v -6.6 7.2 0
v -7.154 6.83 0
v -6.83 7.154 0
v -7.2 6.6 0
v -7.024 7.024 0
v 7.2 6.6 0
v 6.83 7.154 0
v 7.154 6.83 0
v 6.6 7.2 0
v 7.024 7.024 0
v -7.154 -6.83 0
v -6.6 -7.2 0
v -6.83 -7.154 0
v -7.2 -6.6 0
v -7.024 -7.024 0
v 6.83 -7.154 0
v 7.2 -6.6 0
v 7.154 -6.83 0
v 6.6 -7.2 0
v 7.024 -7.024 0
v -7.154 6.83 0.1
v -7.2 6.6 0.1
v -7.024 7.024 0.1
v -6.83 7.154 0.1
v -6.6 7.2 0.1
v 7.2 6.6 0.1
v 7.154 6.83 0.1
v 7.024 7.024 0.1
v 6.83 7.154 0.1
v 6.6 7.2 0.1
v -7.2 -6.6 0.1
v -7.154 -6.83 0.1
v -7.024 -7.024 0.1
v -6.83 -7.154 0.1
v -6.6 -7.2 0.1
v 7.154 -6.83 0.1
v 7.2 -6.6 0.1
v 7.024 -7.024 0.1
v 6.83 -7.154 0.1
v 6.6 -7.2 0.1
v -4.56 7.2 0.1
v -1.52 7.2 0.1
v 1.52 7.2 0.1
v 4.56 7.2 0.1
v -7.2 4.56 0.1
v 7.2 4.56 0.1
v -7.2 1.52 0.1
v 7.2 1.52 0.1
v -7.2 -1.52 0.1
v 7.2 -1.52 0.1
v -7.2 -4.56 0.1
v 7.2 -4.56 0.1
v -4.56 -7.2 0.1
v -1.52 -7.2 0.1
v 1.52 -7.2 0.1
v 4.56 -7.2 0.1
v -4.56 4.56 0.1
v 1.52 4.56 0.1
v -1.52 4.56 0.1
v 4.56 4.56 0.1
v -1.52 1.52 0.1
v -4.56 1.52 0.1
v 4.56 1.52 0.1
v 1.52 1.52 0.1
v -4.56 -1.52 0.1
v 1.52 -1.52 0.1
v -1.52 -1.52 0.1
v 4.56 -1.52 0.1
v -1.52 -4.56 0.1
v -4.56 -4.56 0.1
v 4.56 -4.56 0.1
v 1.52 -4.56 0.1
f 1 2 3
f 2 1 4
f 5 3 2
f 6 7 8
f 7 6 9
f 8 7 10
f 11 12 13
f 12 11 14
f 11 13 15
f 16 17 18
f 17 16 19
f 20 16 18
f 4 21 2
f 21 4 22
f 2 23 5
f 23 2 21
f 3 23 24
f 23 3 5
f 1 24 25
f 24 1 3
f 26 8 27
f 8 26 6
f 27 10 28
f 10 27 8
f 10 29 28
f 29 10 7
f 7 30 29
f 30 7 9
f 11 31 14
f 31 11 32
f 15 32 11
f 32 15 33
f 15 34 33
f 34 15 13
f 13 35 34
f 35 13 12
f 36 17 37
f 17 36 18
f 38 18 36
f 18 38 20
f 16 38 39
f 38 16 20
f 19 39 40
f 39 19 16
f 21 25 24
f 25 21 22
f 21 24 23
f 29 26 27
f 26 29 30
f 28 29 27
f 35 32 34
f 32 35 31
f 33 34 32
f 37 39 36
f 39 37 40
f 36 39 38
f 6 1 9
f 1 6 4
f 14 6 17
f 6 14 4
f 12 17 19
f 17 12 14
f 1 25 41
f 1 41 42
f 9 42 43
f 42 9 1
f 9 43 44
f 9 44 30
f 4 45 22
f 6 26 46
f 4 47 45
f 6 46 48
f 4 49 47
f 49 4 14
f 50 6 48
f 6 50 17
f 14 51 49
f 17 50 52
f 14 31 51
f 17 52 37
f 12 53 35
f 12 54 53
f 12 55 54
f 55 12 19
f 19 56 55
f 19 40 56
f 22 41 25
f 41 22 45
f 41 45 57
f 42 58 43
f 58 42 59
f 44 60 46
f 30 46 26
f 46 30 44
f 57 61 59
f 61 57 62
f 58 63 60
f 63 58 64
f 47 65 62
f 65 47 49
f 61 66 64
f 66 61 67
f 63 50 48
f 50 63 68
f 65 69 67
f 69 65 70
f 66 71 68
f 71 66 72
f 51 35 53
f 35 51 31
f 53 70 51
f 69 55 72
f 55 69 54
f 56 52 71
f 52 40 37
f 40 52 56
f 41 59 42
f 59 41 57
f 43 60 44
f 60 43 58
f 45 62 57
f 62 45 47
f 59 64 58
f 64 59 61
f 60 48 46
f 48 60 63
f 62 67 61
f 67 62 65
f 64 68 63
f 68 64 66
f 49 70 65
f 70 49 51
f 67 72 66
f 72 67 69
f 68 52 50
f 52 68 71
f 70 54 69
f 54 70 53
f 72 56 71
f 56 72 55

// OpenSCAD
// file: ../p/1-4cyli.scad
use <../lib.scad>
function ldraw_lib__1_4cyli() = [
// 0 Cylinder 0.25
// 0 Name: 1-4cyli.dat
// 0 Author: James Jessiman
// 0 !LDRAW_ORG Primitive UPDATE 2012-01
// 0 !LICENSE Licensed under CC BY 4.0 : see CAreadme.txt
// 
// 0 BFC CERTIFY CCW
  [0,"BFC","CERTIFY"],
  [0,"BFC","CCW"],
// 
// 0 !HISTORY 2002-03-23 [sbliss] Added BFC statement.
// 0 !HISTORY 2002-04-25 [PTadmin] Official Update 2002-02
// 0 !HISTORY 2007-06-22 [PTadmin] Header formatted for Contributor Agreement
// 0 !HISTORY 2008-07-01 [PTadmin] Official Update 2008-01
// 0 !HISTORY 2012-02-16 [Philo] Changed to CCW
// 0 !HISTORY 2012-03-30 [PTadmin] Official Update 2012-01
// 
// 
// 4 16 1 1 0 0.9239 1 0.3827 0.9239 0 0.3827 1 0 0
  [4,16,1,1,0,0.9239,1,0.3827,0.9239,0,0.3827,1,0,0],
// 5 24 1 0 0 1 1 0 0.9239 0 0.3827 1 0 -1
  [5,24,1,0,0,1,1,0,0.9239,0,0.3827,1,0,-1],
// 4 16 0.9239 1 0.3827 0.7071 1 0.7071 0.7071 0 0.7071 0.9239 0 0.3827
  [4,16,0.9239,1,0.3827,0.7071,1,0.7071,0.7071,0,0.7071,0.9239,0,0.3827],
// 5 24 0.9239 0 0.3827 0.9239 1 0.3827 0.7071 0 0.7071 1 0 0
  [5,24,0.9239,0,0.3827,0.9239,1,0.3827,0.7071,0,0.7071,1,0,0],
// 4 16 0.7071 1 0.7071 0.3827 1 0.9239 0.3827 0 0.9239 0.7071 0 0.7071
  [4,16,0.7071,1,0.7071,0.3827,1,0.9239,0.3827,0,0.9239,0.7071,0,0.7071],
// 5 24 0.7071 0 0.7071 0.7071 1 0.7071 0.3827 0 0.9239 0.9239 0 0.3827
  [5,24,0.7071,0,0.7071,0.7071,1,0.7071,0.3827,0,0.9239,0.9239,0,0.3827],
// 4 16 0.3827 1 0.9239 0 1 1 0 0 1 0.3827 0 0.9239
  [4,16,0.3827,1,0.9239,0,1,1,0,0,1,0.3827,0,0.9239],
// 5 24 0.3827 0 0.9239 0.3827 1 0.9239 0 0 1 0.7071 0 0.7071
  [5,24,0.3827,0,0.9239,0.3827,1,0.9239,0,0,1,0.7071,0,0.7071],
// 5 24 0 0 1 0 1 1 0.3827 0 0.9239 -1 0 1
  [5,24,0,0,1,0,1,1,0.3827,0,0.9239,-1,0,1],
];
module ldraw_lib__1_4cyli(step=0, col=false, unit=2/5, alt=false, line=0.2, solid=!$preview)
    makepoly(ldraw_lib__1_4cyli(), step=step, col=col, unit=unit, alt=alt, line=line, solid=solid);
ldraw_lib__1_4cyli(line=0.2);
// file: ../p/1-4chrd.scad
use <../lib.scad>
function ldraw_lib__1_4chrd() = [
// 0 Chord 0.25
// 0 Name: 1-4chrd.dat
// 0 Author: Max Martin Richter [MMR1988]
// 0 !LDRAW_ORG Primitive UPDATE 2023-05
// 0 !LICENSE Licensed under CC BY 4.0 : see CAreadme.txt
// 
// 0 BFC CERTIFY CCW
  [0,"BFC","CERTIFY"],
  [0,"BFC","CCW"],
// 
// 0 !HISTORY 2004-04-22 [PTadmin] Official Update 2004-02
// 0 !HISTORY 2007-10-09 [PTadmin] Header formatted for Contributor Agreement
// 0 !HISTORY 2008-07-01 [PTadmin] Official Update 2008-01
// 0 !HISTORY 2012-08-02 [MMR1988] Re-creation with PrimGen2 and Rectifier
// 0 !HISTORY 2012-08-09 [PTadmin] Official Update 2012-02
// 0 !HISTORY 2023-10-27 [OrionP] Change author to MMR1988 from hafhead
// 0 !HISTORY 2023-10-31 [OrionP] Official Update 2023-05
// 
// 4 16 0.9239 0 0.3827 0.3827 0 0.9239 0 0 1 1 0 0
  [4,16,0.9239,0,0.3827,0.3827,0,0.9239,0,0,1,1,0,0],
// 3 16 0.7071 0 0.7071 0.3827 0 0.9239 0.9239 0 0.3827
  [3,16,0.7071,0,0.7071,0.3827,0,0.9239,0.9239,0,0.3827],
];
module ldraw_lib__1_4chrd(step=0, col=false, unit=2/5, alt=false, line=0.2, solid=!$preview)
    makepoly(ldraw_lib__1_4chrd(), step=step, col=col, unit=unit, alt=alt, line=line, solid=solid);
ldraw_lib__1_4chrd(line=0.2);
// main file
use <../lib.scad>
use <../p/1-4chrd.scad>
use <../p/1-4cyli.scad>
function ldraw_lib__6148328a() = [
// 0 Sticker  1.8 x  1.8 Chequered
// 0 Name: 6148328a.dat
// 0 Author: Massimo Maso [Sirio]
// 0 !LDRAW_ORG Part UPDATE 2024-01
// 0 !LICENSE Licensed under CC BY 4.0 : see CAreadme.txt
// 
// 0 BFC CERTIFY CCW
  [0,"BFC","CERTIFY"],
  [0,"BFC","CCW"],
// 
// 0 !KEYWORDS 917K, 919, Bricklink 75876stk01, Brickowl 852010, Hybrid, Pit Lane
// 0 !KEYWORDS Porsche, Rebrickable 26357, set 75876, Speed Champions
// 
// 0 !HISTORY 2024-01-29 [OrionP] Official Update 2024-01
// 
// 
// 0 // Primitives
// 
// 1 16 -16.5 0 16.5 -1.5 0 0 0 -1 0 0 0 1.5 1-4chrd.dat
  [1,16,-16.5,0,16.5,-1.5,0,0,0,-1,0,0,0,1.5, ldraw_lib__1_4chrd()],
// 1 16 16.5 0 16.5 1.5 0 0 0 -1 0 0 0 1.5 1-4chrd.dat
  [1,16,16.5,0,16.5,1.5,0,0,0,-1,0,0,0,1.5, ldraw_lib__1_4chrd()],
// 1 16 -16.5 0 -16.5 -1.5 0 0 0 -1 0 0 0 -1.5 1-4chrd.dat
  [1,16,-16.5,0,-16.5,-1.5,0,0,0,-1,0,0,0,-1.5, ldraw_lib__1_4chrd()],
// 1 16 16.5 0 -16.5 1.5 0 0 0 -1 0 0 0 -1.5 1-4chrd.dat
  [1,16,16.5,0,-16.5,1.5,0,0,0,-1,0,0,0,-1.5, ldraw_lib__1_4chrd()],
// 1 16 -16.5 0 16.5 -1.5 0 0 0 -.25 0 0 0 1.5 1-4cyli.dat
  [1,16,-16.5,0,16.5,-1.5,0,0,0,-.25,0,0,0,1.5, ldraw_lib__1_4cyli()],
// 1 16 16.5 0 16.5 1.5 0 0 0 -.25 0 0 0 1.5 1-4cyli.dat
  [1,16,16.5,0,16.5,1.5,0,0,0,-.25,0,0,0,1.5, ldraw_lib__1_4cyli()],
// 1 16 -16.5 0 -16.5 -1.5 0 0 0 -.25 0 0 0 -1.5 1-4cyli.dat
  [1,16,-16.5,0,-16.5,-1.5,0,0,0,-.25,0,0,0,-1.5, ldraw_lib__1_4cyli()],
// 1 16 16.5 0 -16.5 1.5 0 0 0 -.25 0 0 0 -1.5 1-4cyli.dat
  [1,16,16.5,0,-16.5,1.5,0,0,0,-.25,0,0,0,-1.5, ldraw_lib__1_4cyli()],
// 1 0 -16.5 -.25 16.5 -1.5 0 0 0 1 0 0 0 1.5 1-4chrd.dat
  [1,0,-16.5,-.25,16.5,-1.5,0,0,0,1,0,0,0,1.5, ldraw_lib__1_4chrd()],
// 1 0 16.5 -.25 16.5 1.5 0 0 0 1 0 0 0 1.5 1-4chrd.dat
  [1,0,16.5,-.25,16.5,1.5,0,0,0,1,0,0,0,1.5, ldraw_lib__1_4chrd()],
// 1 0 -16.5 -.25 -16.5 -1.5 0 0 0 1 0 0 0 -1.5 1-4chrd.dat
  [1,0,-16.5,-.25,-16.5,-1.5,0,0,0,1,0,0,0,-1.5, ldraw_lib__1_4chrd()],
// 1 0 16.5 -.25 -16.5 1.5 0 0 0 1 0 0 0 -1.5 1-4chrd.dat
  [1,0,16.5,-.25,-16.5,1.5,0,0,0,1,0,0,0,-1.5, ldraw_lib__1_4chrd()],
// 0 // Bottom face
// 4 16 16.5 0 18 18 0 16.5 -18 0 16.5 -16.5 0 18
  [4,16,16.5,0,18,18,0,16.5,-18,0,16.5,-16.5,0,18],
// 4 16 18 0 16.5 18 0 -16.5 -18 0 -16.5 -18 0 16.5
  [4,16,18,0,16.5,18,0,-16.5,-18,0,-16.5,-18,0,16.5],
// 4 16 16.5 0 -18 -16.5 0 -18 -18 0 -16.5 18 0 -16.5
  [4,16,16.5,0,-18,-16.5,0,-18,-18,0,-16.5,18,0,-16.5],
// 0 // Lateral face
// 3 16 -16.5 0 18 -16.5 -.25 18 -11.4 -.25 18
  [3,16,-16.5,0,18,-16.5,-.25,18,-11.4,-.25,18],
// 3 16 -16.5 0 18 -11.4 -.25 18 -3.8 -.25 18
  [3,16,-16.5,0,18,-11.4,-.25,18,-3.8,-.25,18],
// 4 16 -16.5 0 18 -3.8 -.25 18 3.8 -.25 18 16.5 0 18
  [4,16,-16.5,0,18,-3.8,-.25,18,3.8,-.25,18,16.5,0,18],
// 3 16 16.5 0 18 3.8 -.25 18 11.4 -.25 18
  [3,16,16.5,0,18,3.8,-.25,18,11.4,-.25,18],
// 3 16 16.5 0 18 11.4 -.25 18 16.5 -.25 18
  [3,16,16.5,0,18,11.4,-.25,18,16.5,-.25,18],
// 3 16 -18 0 16.5 -18 -.25 11.4 -18 -.25 16.5
  [3,16,-18,0,16.5,-18,-.25,11.4,-18,-.25,16.5],
// 3 16 18 0 16.5 18 -.25 16.5 18 -.25 11.4
  [3,16,18,0,16.5,18,-.25,16.5,18,-.25,11.4],
// 3 16 -18 0 16.5 -18 -.25 3.8 -18 -.25 11.4
  [3,16,-18,0,16.5,-18,-.25,3.8,-18,-.25,11.4],
// 3 16 18 0 16.5 18 -.25 11.4 18 -.25 3.8
  [3,16,18,0,16.5,18,-.25,11.4,18,-.25,3.8],
// 4 16 -18 0 16.5 -18 0 -16.5 -18 -.25 -3.8 -18 -.25 3.8
  [4,16,-18,0,16.5,-18,0,-16.5,-18,-.25,-3.8,-18,-.25,3.8],
// 4 16 18 0 16.5 18 -.25 3.8 18 -.25 -3.8 18 0 -16.5
  [4,16,18,0,16.5,18,-.25,3.8,18,-.25,-3.8,18,0,-16.5],
// 3 16 -18 0 -16.5 -18 -.25 -11.4 -18 -.25 -3.8
  [3,16,-18,0,-16.5,-18,-.25,-11.4,-18,-.25,-3.8],
// 3 16 18 0 -16.5 18 -.25 -3.8 18 -.25 -11.4
  [3,16,18,0,-16.5,18,-.25,-3.8,18,-.25,-11.4],
// 3 16 -18 0 -16.5 -18 -.25 -16.5 -18 -.25 -11.4
  [3,16,-18,0,-16.5,-18,-.25,-16.5,-18,-.25,-11.4],
// 3 16 18 0 -16.5 18 -.25 -11.4 18 -.25 -16.5
  [3,16,18,0,-16.5,18,-.25,-11.4,18,-.25,-16.5],
// 3 16 -16.5 0 -18 -11.4 -.25 -18 -16.5 -.25 -18
  [3,16,-16.5,0,-18,-11.4,-.25,-18,-16.5,-.25,-18],
// 3 16 -16.5 0 -18 -3.8 -.25 -18 -11.4 -.25 -18
  [3,16,-16.5,0,-18,-3.8,-.25,-18,-11.4,-.25,-18],
// 4 16 -16.5 0 -18 16.5 0 -18 3.8 -.25 -18 -3.8 -.25 -18
  [4,16,-16.5,0,-18,16.5,0,-18,3.8,-.25,-18,-3.8,-.25,-18],
// 3 16 16.5 0 -18 11.4 -.25 -18 3.8 -.25 -18
  [3,16,16.5,0,-18,11.4,-.25,-18,3.8,-.25,-18],
// 3 16 16.5 0 -18 16.5 -.25 -18 11.4 -.25 -18
  [3,16,16.5,0,-18,16.5,-.25,-18,11.4,-.25,-18],
// 0 // Top face
// 0 // Black faces
// 4 0 -11.4 -.25 18 -16.5 -.25 18 -18 -.25 16.5 -18 -.25 11.4
  [4,0,-11.4,-.25,18,-16.5,-.25,18,-18,-.25,16.5,-18,-.25,11.4],
// 3 0 -11.4 -.25 18 -18 -.25 11.4 -11.4 -.25 11.4
  [3,0,-11.4,-.25,18,-18,-.25,11.4,-11.4,-.25,11.4],
// 4 0 -3.8 -.25 18 -3.8 -.25 11.4 3.8 -.25 11.4 3.8 -.25 18
  [4,0,-3.8,-.25,18,-3.8,-.25,11.4,3.8,-.25,11.4,3.8,-.25,18],
// 3 0 11.4 -.25 18 11.4 -.25 11.4 18 -.25 11.4
  [3,0,11.4,-.25,18,11.4,-.25,11.4,18,-.25,11.4],
// 4 0 11.4 -.25 18 18 -.25 11.4 18 -.25 16.5 16.5 -.25 18
  [4,0,11.4,-.25,18,18,-.25,11.4,18,-.25,16.5,16.5,-.25,18],
// 4 0 -11.4 -.25 11.4 -11.4 -.25 3.8 -3.8 -.25 3.8 -3.8 -.25 11.4
  [4,0,-11.4,-.25,11.4,-11.4,-.25,3.8,-3.8,-.25,3.8,-3.8,-.25,11.4],
// 4 0 3.8 -.25 11.4 3.8 -.25 3.8 11.4 -.25 3.8 11.4 -.25 11.4
  [4,0,3.8,-.25,11.4,3.8,-.25,3.8,11.4,-.25,3.8,11.4,-.25,11.4],
// 4 0 -18 -.25 3.8 -18 -.25 -3.8 -11.4 -.25 -3.8 -11.4 -.25 3.8
  [4,0,-18,-.25,3.8,-18,-.25,-3.8,-11.4,-.25,-3.8,-11.4,-.25,3.8],
// 4 0 -3.8 -.25 3.8 -3.8 -.25 -3.8 3.8 -.25 -3.8 3.8 -.25 3.8
  [4,0,-3.8,-.25,3.8,-3.8,-.25,-3.8,3.8,-.25,-3.8,3.8,-.25,3.8],
// 4 0 11.4 -.25 3.8 11.4 -.25 -3.8 18 -.25 -3.8 18 -.25 3.8
  [4,0,11.4,-.25,3.8,11.4,-.25,-3.8,18,-.25,-3.8,18,-.25,3.8],
// 4 0 -11.4 -.25 -3.8 -11.4 -.25 -11.4 -3.8 -.25 -11.4 -3.8 -.25 -3.8
  [4,0,-11.4,-.25,-3.8,-11.4,-.25,-11.4,-3.8,-.25,-11.4,-3.8,-.25,-3.8],
// 4 0 3.8 -.25 -3.8 3.8 -.25 -11.4 11.4 -.25 -11.4 11.4 -.25 -3.8
  [4,0,3.8,-.25,-3.8,3.8,-.25,-11.4,11.4,-.25,-11.4,11.4,-.25,-3.8],
// 4 0 -11.4 -.25 -18 -18 -.25 -11.4 -18 -.25 -16.5 -16.5 -.25 -18
  [4,0,-11.4,-.25,-18,-18,-.25,-11.4,-18,-.25,-16.5,-16.5,-.25,-18],
// 3 0 -11.4 -.25 -18 -11.4 -.25 -11.4 -18 -.25 -11.4
  [3,0,-11.4,-.25,-18,-11.4,-.25,-11.4,-18,-.25,-11.4],
// 4 0 -3.8 -.25 -11.4 -3.8 -.25 -18 3.8 -.25 -18 3.8 -.25 -11.4
  [4,0,-3.8,-.25,-11.4,-3.8,-.25,-18,3.8,-.25,-18,3.8,-.25,-11.4],
// 3 0 11.4 -.25 -18 18 -.25 -11.4 11.4 -.25 -11.4
  [3,0,11.4,-.25,-18,18,-.25,-11.4,11.4,-.25,-11.4],
// 4 0 11.4 -.25 -18 16.5 -.25 -18 18 -.25 -16.5 18 -.25 -11.4
  [4,0,11.4,-.25,-18,16.5,-.25,-18,18,-.25,-16.5,18,-.25,-11.4],
// 0 // White faces
// 4 15 -11.4 -.25 18 -11.4 -.25 11.4 -3.8 -.25 11.4 -3.8 -.25 18
  [4,15,-11.4,-.25,18,-11.4,-.25,11.4,-3.8,-.25,11.4,-3.8,-.25,18],
// 4 15 3.8 -.25 18 3.8 -.25 11.4 11.4 -.25 11.4 11.4 -.25 18
  [4,15,3.8,-.25,18,3.8,-.25,11.4,11.4,-.25,11.4,11.4,-.25,18],
// 4 15 -18 -.25 11.4 -18 -.25 3.8 -11.4 -.25 3.8 -11.4 -.25 11.4
  [4,15,-18,-.25,11.4,-18,-.25,3.8,-11.4,-.25,3.8,-11.4,-.25,11.4],
// 4 15 -3.8 -.25 11.4 -3.8 -.25 3.8 3.8 -.25 3.8 3.8 -.25 11.4
  [4,15,-3.8,-.25,11.4,-3.8,-.25,3.8,3.8,-.25,3.8,3.8,-.25,11.4],
// 4 15 11.4 -.25 11.4 11.4 -.25 3.8 18 -.25 3.8 18 -.25 11.4
  [4,15,11.4,-.25,11.4,11.4,-.25,3.8,18,-.25,3.8,18,-.25,11.4],
// 4 15 -11.4 -.25 3.8 -11.4 -.25 -3.8 -3.8 -.25 -3.8 -3.8 -.25 3.8
  [4,15,-11.4,-.25,3.8,-11.4,-.25,-3.8,-3.8,-.25,-3.8,-3.8,-.25,3.8],
// 4 15 3.8 -.25 3.8 3.8 -.25 -3.8 11.4 -.25 -3.8 11.4 -.25 3.8
  [4,15,3.8,-.25,3.8,3.8,-.25,-3.8,11.4,-.25,-3.8,11.4,-.25,3.8],
// 4 15 -18 -.25 -3.8 -18 -.25 -11.4 -11.4 -.25 -11.4 -11.4 -.25 -3.8
  [4,15,-18,-.25,-3.8,-18,-.25,-11.4,-11.4,-.25,-11.4,-11.4,-.25,-3.8],
// 4 15 -3.8 -.25 -3.8 -3.8 -.25 -11.4 3.8 -.25 -11.4 3.8 -.25 -3.8
  [4,15,-3.8,-.25,-3.8,-3.8,-.25,-11.4,3.8,-.25,-11.4,3.8,-.25,-3.8],
// 4 15 11.4 -.25 -3.8 11.4 -.25 -11.4 18 -.25 -11.4 18 -.25 -3.8
  [4,15,11.4,-.25,-3.8,11.4,-.25,-11.4,18,-.25,-11.4,18,-.25,-3.8],
// 4 15 -11.4 -.25 -11.4 -11.4 -.25 -18 -3.8 -.25 -18 -3.8 -.25 -11.4
  [4,15,-11.4,-.25,-11.4,-11.4,-.25,-18,-3.8,-.25,-18,-3.8,-.25,-11.4],
// 4 15 3.8 -.25 -11.4 3.8 -.25 -18 11.4 -.25 -18 11.4 -.25 -11.4
  [4,15,3.8,-.25,-11.4,3.8,-.25,-18,11.4,-.25,-18,11.4,-.25,-11.4],
];
module ldraw_lib__6148328a(step=0, col=false, unit=2/5, alt=false, line=0.2, solid=!$preview)
    makepoly(ldraw_lib__6148328a(), step=step, col=col, unit=unit, alt=alt, line=line, solid=solid);
ldraw_lib__6148328a(line=0.2);
